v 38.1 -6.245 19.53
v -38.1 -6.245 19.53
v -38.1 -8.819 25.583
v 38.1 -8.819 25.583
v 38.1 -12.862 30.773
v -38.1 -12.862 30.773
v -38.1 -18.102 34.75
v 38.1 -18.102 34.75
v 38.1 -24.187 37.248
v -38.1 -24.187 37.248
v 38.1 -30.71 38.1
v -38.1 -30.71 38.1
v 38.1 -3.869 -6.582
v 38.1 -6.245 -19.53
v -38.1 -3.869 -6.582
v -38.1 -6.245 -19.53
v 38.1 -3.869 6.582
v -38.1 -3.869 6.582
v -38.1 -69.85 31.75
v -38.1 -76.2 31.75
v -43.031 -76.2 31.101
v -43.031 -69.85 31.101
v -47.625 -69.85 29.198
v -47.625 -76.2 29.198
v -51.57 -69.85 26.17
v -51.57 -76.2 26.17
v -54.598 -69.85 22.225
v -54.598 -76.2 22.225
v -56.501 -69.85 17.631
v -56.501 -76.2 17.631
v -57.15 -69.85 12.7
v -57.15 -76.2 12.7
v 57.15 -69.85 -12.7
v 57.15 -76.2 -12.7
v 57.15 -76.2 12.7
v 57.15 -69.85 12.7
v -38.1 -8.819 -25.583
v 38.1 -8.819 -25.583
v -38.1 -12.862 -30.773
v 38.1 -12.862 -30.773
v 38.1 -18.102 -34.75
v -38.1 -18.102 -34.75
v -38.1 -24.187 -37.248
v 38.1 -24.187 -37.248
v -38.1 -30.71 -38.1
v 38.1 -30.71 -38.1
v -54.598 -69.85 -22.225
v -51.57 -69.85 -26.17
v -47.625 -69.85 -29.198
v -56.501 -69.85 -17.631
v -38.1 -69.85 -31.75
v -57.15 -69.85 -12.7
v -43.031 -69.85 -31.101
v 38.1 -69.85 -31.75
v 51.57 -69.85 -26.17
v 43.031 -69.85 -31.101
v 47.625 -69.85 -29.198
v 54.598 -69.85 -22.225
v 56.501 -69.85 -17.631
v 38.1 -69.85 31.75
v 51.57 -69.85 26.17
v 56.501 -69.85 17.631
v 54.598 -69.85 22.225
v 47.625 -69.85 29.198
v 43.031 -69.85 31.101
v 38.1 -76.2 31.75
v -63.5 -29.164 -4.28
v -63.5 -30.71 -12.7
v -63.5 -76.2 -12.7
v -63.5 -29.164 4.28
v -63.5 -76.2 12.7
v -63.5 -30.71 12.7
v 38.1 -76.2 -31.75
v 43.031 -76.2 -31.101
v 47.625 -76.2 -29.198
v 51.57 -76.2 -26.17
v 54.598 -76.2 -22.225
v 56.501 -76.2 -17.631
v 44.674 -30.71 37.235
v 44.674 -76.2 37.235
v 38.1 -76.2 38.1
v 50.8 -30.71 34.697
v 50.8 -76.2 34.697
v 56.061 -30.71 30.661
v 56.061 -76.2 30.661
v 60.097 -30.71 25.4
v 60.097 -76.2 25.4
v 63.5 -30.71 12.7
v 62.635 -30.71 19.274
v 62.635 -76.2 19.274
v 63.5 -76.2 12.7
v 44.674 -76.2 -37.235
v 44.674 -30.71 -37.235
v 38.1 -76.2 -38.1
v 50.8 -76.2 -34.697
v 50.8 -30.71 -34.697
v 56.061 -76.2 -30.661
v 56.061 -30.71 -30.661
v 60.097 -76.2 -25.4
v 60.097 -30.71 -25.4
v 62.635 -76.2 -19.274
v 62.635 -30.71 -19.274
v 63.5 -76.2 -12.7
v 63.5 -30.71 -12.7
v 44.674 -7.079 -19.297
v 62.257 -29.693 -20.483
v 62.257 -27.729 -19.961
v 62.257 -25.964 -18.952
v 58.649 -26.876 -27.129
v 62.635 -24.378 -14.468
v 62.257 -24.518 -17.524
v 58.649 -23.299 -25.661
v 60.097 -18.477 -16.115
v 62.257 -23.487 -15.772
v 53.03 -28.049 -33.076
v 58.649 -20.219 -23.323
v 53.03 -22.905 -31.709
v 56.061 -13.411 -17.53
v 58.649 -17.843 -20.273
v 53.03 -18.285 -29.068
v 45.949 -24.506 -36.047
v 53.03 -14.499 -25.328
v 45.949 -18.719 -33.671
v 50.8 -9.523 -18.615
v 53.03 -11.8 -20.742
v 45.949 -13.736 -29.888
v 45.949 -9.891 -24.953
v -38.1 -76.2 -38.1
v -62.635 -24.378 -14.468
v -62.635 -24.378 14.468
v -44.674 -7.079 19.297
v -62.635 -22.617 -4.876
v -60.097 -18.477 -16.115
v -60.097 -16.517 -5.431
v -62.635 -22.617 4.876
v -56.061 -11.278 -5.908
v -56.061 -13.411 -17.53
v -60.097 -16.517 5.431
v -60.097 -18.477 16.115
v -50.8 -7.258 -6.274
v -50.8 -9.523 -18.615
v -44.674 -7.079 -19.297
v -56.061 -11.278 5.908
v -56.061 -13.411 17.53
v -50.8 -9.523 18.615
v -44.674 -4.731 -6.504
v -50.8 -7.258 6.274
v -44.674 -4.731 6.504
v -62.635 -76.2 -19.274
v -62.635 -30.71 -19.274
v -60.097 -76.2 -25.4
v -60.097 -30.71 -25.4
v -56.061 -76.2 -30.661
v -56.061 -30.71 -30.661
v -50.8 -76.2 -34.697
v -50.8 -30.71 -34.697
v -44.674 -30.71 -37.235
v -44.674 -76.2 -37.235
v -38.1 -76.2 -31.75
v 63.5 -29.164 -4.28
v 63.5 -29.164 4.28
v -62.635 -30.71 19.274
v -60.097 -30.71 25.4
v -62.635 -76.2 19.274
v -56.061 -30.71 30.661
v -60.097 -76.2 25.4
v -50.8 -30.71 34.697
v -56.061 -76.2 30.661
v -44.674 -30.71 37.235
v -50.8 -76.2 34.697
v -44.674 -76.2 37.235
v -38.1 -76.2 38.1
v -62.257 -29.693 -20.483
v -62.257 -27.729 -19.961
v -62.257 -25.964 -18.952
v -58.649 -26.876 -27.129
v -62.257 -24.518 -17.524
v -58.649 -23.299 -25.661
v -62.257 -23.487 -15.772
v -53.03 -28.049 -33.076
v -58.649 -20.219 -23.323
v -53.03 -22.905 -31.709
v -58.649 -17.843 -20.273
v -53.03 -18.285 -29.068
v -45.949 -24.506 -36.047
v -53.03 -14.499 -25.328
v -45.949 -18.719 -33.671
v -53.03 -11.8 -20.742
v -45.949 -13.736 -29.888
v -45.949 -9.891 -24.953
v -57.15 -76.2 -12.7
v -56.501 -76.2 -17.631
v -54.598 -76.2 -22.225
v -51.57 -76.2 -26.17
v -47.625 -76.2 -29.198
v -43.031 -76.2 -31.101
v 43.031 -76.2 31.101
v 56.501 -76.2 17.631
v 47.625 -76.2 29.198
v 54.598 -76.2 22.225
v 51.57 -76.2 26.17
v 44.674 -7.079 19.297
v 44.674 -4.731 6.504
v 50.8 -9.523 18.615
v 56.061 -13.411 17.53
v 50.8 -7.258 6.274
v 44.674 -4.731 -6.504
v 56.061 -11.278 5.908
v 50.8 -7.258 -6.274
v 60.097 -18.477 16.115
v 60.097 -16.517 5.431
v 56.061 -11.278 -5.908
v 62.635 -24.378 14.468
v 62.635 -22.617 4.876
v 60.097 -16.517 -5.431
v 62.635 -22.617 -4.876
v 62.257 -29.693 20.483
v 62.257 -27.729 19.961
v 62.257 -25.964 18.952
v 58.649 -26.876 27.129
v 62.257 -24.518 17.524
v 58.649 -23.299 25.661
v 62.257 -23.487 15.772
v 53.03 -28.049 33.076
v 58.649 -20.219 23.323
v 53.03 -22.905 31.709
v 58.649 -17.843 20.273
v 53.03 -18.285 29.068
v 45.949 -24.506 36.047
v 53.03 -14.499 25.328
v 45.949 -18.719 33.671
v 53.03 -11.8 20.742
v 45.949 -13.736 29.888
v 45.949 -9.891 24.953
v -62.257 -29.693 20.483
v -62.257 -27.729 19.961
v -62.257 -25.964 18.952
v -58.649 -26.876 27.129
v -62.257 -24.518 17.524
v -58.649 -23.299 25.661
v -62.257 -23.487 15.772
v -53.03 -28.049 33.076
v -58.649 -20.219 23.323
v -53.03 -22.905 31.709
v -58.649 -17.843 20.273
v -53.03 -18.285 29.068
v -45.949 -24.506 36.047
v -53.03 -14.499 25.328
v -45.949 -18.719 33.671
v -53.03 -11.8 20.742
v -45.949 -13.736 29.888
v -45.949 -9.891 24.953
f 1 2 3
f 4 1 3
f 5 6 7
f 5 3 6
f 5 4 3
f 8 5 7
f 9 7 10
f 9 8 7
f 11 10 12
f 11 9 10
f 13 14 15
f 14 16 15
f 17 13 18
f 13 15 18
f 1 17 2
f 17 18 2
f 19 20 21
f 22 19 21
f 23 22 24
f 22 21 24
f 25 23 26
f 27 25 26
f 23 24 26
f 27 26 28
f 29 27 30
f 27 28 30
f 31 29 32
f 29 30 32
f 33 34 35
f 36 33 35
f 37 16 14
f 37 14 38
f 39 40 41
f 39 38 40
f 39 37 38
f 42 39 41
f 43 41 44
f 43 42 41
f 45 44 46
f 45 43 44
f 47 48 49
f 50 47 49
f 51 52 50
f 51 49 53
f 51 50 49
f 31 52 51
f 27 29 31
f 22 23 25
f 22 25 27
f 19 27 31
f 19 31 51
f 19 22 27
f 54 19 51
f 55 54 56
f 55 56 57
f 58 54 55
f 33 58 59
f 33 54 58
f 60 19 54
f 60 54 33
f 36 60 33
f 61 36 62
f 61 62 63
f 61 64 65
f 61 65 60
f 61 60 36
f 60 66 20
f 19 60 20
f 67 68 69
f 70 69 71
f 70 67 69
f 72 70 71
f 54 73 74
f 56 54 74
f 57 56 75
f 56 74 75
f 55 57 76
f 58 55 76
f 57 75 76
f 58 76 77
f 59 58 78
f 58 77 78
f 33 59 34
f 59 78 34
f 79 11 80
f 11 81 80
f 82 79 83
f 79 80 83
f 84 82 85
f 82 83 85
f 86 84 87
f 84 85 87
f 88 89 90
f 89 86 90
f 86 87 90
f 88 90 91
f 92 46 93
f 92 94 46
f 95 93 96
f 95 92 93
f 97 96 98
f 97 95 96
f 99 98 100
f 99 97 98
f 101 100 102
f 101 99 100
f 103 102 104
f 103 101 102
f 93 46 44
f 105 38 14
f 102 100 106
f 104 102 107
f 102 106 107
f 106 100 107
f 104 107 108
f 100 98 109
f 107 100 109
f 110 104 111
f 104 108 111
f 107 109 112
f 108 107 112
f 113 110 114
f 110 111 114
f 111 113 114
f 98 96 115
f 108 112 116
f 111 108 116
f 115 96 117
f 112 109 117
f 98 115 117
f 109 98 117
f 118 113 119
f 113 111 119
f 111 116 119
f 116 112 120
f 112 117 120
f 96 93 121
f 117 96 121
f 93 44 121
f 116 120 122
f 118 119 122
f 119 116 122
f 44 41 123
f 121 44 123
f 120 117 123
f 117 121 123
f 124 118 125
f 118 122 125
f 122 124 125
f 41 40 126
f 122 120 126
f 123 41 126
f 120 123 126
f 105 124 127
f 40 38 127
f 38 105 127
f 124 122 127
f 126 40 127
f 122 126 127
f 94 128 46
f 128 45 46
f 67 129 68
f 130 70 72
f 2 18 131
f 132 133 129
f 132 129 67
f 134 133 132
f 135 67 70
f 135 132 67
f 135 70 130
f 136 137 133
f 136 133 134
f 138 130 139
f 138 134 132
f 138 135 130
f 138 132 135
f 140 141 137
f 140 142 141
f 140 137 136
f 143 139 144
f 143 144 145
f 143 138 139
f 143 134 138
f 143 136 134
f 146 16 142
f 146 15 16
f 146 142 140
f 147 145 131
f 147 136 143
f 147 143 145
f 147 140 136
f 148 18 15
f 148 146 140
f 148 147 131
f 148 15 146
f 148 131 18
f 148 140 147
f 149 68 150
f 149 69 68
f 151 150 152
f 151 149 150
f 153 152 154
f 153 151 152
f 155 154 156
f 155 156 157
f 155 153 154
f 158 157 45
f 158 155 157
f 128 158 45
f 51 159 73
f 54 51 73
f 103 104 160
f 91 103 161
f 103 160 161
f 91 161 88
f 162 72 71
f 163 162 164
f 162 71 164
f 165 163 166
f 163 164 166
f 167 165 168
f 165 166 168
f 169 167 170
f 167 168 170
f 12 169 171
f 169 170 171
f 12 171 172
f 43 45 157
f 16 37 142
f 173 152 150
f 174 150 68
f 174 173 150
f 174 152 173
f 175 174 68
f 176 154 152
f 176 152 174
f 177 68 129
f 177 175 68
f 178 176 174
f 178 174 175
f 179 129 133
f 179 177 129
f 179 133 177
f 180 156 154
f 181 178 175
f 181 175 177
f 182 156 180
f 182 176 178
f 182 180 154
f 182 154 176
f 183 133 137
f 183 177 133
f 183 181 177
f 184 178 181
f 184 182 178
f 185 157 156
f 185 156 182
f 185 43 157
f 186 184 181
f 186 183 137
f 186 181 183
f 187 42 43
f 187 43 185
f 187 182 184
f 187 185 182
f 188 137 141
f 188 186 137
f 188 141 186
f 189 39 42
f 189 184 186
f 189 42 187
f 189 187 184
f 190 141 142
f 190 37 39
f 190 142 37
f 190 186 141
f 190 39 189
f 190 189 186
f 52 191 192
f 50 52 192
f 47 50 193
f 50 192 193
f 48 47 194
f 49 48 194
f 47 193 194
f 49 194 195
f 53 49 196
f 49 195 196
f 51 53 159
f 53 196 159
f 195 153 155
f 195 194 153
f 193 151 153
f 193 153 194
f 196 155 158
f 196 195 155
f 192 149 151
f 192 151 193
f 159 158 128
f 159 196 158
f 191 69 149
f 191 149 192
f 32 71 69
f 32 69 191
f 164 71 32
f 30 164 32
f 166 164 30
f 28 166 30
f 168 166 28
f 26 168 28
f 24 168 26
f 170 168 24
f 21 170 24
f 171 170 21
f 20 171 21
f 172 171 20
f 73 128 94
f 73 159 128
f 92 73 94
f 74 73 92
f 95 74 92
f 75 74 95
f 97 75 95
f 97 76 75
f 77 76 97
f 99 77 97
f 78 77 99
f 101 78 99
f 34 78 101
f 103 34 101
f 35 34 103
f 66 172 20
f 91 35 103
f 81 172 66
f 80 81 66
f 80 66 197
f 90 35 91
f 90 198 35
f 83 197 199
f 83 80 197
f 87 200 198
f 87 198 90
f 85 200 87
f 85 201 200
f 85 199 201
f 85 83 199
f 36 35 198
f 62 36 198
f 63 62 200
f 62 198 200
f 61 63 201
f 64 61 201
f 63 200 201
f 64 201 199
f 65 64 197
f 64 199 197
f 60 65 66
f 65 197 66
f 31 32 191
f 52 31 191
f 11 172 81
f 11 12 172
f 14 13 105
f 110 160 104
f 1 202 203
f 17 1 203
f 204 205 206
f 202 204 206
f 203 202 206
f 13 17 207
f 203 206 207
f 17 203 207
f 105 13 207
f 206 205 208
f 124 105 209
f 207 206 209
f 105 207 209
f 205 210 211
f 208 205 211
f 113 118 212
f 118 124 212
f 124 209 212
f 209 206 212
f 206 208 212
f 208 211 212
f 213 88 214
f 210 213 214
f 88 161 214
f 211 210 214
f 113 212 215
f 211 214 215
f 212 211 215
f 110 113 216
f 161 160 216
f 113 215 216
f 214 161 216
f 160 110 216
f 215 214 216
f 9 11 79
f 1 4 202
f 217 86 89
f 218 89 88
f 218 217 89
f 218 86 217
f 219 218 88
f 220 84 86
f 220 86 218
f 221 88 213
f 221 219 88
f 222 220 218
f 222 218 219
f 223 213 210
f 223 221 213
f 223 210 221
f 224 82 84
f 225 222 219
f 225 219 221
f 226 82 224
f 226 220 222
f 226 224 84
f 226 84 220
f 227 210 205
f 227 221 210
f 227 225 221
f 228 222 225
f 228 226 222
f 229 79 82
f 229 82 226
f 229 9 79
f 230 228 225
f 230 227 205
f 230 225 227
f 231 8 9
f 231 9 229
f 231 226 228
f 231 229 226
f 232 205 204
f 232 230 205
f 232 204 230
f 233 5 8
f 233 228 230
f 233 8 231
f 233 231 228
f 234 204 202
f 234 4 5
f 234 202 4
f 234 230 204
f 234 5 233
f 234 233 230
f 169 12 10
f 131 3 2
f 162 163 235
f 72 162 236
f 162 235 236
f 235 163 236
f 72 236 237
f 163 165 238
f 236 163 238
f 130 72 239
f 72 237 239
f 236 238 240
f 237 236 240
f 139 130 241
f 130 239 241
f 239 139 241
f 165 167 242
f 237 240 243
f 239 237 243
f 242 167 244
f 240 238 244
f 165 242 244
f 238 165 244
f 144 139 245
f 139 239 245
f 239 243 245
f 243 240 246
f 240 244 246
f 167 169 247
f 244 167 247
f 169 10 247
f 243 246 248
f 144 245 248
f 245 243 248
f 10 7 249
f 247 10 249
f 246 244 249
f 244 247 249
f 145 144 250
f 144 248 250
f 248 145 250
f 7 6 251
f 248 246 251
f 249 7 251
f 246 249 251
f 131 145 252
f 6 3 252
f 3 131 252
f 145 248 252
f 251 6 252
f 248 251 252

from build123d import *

# Parameters (mm, degrees)
F0_W     = 127
F0_H     = 76.2
F1_DEPTH = 76.2
F3_DEPTH = 127.001
F4_R     = 25.4
F6_DEPTH = 6.35


with BuildPart() as f1:
    # F0 (on Front) → F1 (new body)
    with BuildSketch(Plane.XZ):
        Rectangle(F0_W, F0_H)
    extrude(amount=F1_DEPTH)

    # F2 (on face) → F3 (cut, through all)
    with BuildSketch(Plane(origin=(-63.5, 0, 0), x_dir=(0, -1, 0), z_dir=(-1, 0, 0))):
        with BuildLine():
            ThreePointArc((14.3655382942, 38.1), (37.6635127669, 61.5633803993), (68.9486063382, 72.2670598849))
            Line((68.9486063382, 72.2670598849), (-52.0951251411, 60.1213361119))
            Line((-52.0951251411, 60.1213361119), (-33.0926589668, -48.5322624445))
            Line((-33.0926589668, -48.5322624445), (48.5539544729, -67.162540312))
            ThreePointArc((48.5539544729, -67.162540312), (29.1590805148, -55.3377136177), (14.3655382942, -38.1))
            Line((14.3655382942, -38.1), (0, -38.1))
            Line((0, -38.1), (0, 38.1))
            Line((0, 38.1), (14.3655382942, 38.1))
        make_face()
        with BuildLine():
            ThreePointArc((14.3655382942, -38.1), (3.5700429957, 0), (14.3655382942, 38.1))
            Line((14.3655382942, 38.1), (0, 38.1))
            Line((0, 38.1), (0, -38.1))
            Line((0, -38.1), (14.3655382942, -38.1))
        make_face()
    extrude(amount=-F3_DEPTH, mode=Mode.SUBTRACT)

    # F4
    f4_edges = [f1.edges().sort_by_distance(p)[0] for p in [
        (-63.5, -45.282769, 38.1),
        (63.5, -45.282769, 38.1),
        (-63.5, -45.282769, -38.1),
        (63.5, -45.282769, -38.1),
        (63.5, -3.570043, 0),
        (-63.5, -3.570043, 0),
        (0, -14.365538, -38.1),
        (0, -14.365538, 38.1),
    ]]
    fillet(f4_edges, radius=F4_R)

    # F5 (on face) → F6 (cut)
    with BuildSketch(Plane.XZ.offset(76.2)):
        with BuildLine():
            Line((57.1500010133, -12.7), (57.1500010133, 12.7))
            ThreePointArc((57.1500010133, 12.7), (51.5703848981, 26.1703848981), (38.1, 31.7500010133))
            Line((38.1, 31.7500010133), (-38.1, 31.7500010133))
            ThreePointArc((-38.1, 31.7500010133), (-51.5703848981, 26.1703848981), (-57.1500010133, 12.7))
            Line((-57.1500010133, 12.7), (-57.1500010133, -12.7))
            ThreePointArc((-57.1500010133, -12.7), (-51.5703848981, -26.1703848981), (-38.1, -31.7500010133))
            Line((-38.1, -31.7500010133), (38.1, -31.7500010133))
            ThreePointArc((38.1, -31.7500010133), (51.5703848981, -26.1703848981), (57.1500010133, -12.7))
        make_face()
    extrude(amount=-F6_DEPTH, mode=Mode.SUBTRACT)


solid = f1.part
